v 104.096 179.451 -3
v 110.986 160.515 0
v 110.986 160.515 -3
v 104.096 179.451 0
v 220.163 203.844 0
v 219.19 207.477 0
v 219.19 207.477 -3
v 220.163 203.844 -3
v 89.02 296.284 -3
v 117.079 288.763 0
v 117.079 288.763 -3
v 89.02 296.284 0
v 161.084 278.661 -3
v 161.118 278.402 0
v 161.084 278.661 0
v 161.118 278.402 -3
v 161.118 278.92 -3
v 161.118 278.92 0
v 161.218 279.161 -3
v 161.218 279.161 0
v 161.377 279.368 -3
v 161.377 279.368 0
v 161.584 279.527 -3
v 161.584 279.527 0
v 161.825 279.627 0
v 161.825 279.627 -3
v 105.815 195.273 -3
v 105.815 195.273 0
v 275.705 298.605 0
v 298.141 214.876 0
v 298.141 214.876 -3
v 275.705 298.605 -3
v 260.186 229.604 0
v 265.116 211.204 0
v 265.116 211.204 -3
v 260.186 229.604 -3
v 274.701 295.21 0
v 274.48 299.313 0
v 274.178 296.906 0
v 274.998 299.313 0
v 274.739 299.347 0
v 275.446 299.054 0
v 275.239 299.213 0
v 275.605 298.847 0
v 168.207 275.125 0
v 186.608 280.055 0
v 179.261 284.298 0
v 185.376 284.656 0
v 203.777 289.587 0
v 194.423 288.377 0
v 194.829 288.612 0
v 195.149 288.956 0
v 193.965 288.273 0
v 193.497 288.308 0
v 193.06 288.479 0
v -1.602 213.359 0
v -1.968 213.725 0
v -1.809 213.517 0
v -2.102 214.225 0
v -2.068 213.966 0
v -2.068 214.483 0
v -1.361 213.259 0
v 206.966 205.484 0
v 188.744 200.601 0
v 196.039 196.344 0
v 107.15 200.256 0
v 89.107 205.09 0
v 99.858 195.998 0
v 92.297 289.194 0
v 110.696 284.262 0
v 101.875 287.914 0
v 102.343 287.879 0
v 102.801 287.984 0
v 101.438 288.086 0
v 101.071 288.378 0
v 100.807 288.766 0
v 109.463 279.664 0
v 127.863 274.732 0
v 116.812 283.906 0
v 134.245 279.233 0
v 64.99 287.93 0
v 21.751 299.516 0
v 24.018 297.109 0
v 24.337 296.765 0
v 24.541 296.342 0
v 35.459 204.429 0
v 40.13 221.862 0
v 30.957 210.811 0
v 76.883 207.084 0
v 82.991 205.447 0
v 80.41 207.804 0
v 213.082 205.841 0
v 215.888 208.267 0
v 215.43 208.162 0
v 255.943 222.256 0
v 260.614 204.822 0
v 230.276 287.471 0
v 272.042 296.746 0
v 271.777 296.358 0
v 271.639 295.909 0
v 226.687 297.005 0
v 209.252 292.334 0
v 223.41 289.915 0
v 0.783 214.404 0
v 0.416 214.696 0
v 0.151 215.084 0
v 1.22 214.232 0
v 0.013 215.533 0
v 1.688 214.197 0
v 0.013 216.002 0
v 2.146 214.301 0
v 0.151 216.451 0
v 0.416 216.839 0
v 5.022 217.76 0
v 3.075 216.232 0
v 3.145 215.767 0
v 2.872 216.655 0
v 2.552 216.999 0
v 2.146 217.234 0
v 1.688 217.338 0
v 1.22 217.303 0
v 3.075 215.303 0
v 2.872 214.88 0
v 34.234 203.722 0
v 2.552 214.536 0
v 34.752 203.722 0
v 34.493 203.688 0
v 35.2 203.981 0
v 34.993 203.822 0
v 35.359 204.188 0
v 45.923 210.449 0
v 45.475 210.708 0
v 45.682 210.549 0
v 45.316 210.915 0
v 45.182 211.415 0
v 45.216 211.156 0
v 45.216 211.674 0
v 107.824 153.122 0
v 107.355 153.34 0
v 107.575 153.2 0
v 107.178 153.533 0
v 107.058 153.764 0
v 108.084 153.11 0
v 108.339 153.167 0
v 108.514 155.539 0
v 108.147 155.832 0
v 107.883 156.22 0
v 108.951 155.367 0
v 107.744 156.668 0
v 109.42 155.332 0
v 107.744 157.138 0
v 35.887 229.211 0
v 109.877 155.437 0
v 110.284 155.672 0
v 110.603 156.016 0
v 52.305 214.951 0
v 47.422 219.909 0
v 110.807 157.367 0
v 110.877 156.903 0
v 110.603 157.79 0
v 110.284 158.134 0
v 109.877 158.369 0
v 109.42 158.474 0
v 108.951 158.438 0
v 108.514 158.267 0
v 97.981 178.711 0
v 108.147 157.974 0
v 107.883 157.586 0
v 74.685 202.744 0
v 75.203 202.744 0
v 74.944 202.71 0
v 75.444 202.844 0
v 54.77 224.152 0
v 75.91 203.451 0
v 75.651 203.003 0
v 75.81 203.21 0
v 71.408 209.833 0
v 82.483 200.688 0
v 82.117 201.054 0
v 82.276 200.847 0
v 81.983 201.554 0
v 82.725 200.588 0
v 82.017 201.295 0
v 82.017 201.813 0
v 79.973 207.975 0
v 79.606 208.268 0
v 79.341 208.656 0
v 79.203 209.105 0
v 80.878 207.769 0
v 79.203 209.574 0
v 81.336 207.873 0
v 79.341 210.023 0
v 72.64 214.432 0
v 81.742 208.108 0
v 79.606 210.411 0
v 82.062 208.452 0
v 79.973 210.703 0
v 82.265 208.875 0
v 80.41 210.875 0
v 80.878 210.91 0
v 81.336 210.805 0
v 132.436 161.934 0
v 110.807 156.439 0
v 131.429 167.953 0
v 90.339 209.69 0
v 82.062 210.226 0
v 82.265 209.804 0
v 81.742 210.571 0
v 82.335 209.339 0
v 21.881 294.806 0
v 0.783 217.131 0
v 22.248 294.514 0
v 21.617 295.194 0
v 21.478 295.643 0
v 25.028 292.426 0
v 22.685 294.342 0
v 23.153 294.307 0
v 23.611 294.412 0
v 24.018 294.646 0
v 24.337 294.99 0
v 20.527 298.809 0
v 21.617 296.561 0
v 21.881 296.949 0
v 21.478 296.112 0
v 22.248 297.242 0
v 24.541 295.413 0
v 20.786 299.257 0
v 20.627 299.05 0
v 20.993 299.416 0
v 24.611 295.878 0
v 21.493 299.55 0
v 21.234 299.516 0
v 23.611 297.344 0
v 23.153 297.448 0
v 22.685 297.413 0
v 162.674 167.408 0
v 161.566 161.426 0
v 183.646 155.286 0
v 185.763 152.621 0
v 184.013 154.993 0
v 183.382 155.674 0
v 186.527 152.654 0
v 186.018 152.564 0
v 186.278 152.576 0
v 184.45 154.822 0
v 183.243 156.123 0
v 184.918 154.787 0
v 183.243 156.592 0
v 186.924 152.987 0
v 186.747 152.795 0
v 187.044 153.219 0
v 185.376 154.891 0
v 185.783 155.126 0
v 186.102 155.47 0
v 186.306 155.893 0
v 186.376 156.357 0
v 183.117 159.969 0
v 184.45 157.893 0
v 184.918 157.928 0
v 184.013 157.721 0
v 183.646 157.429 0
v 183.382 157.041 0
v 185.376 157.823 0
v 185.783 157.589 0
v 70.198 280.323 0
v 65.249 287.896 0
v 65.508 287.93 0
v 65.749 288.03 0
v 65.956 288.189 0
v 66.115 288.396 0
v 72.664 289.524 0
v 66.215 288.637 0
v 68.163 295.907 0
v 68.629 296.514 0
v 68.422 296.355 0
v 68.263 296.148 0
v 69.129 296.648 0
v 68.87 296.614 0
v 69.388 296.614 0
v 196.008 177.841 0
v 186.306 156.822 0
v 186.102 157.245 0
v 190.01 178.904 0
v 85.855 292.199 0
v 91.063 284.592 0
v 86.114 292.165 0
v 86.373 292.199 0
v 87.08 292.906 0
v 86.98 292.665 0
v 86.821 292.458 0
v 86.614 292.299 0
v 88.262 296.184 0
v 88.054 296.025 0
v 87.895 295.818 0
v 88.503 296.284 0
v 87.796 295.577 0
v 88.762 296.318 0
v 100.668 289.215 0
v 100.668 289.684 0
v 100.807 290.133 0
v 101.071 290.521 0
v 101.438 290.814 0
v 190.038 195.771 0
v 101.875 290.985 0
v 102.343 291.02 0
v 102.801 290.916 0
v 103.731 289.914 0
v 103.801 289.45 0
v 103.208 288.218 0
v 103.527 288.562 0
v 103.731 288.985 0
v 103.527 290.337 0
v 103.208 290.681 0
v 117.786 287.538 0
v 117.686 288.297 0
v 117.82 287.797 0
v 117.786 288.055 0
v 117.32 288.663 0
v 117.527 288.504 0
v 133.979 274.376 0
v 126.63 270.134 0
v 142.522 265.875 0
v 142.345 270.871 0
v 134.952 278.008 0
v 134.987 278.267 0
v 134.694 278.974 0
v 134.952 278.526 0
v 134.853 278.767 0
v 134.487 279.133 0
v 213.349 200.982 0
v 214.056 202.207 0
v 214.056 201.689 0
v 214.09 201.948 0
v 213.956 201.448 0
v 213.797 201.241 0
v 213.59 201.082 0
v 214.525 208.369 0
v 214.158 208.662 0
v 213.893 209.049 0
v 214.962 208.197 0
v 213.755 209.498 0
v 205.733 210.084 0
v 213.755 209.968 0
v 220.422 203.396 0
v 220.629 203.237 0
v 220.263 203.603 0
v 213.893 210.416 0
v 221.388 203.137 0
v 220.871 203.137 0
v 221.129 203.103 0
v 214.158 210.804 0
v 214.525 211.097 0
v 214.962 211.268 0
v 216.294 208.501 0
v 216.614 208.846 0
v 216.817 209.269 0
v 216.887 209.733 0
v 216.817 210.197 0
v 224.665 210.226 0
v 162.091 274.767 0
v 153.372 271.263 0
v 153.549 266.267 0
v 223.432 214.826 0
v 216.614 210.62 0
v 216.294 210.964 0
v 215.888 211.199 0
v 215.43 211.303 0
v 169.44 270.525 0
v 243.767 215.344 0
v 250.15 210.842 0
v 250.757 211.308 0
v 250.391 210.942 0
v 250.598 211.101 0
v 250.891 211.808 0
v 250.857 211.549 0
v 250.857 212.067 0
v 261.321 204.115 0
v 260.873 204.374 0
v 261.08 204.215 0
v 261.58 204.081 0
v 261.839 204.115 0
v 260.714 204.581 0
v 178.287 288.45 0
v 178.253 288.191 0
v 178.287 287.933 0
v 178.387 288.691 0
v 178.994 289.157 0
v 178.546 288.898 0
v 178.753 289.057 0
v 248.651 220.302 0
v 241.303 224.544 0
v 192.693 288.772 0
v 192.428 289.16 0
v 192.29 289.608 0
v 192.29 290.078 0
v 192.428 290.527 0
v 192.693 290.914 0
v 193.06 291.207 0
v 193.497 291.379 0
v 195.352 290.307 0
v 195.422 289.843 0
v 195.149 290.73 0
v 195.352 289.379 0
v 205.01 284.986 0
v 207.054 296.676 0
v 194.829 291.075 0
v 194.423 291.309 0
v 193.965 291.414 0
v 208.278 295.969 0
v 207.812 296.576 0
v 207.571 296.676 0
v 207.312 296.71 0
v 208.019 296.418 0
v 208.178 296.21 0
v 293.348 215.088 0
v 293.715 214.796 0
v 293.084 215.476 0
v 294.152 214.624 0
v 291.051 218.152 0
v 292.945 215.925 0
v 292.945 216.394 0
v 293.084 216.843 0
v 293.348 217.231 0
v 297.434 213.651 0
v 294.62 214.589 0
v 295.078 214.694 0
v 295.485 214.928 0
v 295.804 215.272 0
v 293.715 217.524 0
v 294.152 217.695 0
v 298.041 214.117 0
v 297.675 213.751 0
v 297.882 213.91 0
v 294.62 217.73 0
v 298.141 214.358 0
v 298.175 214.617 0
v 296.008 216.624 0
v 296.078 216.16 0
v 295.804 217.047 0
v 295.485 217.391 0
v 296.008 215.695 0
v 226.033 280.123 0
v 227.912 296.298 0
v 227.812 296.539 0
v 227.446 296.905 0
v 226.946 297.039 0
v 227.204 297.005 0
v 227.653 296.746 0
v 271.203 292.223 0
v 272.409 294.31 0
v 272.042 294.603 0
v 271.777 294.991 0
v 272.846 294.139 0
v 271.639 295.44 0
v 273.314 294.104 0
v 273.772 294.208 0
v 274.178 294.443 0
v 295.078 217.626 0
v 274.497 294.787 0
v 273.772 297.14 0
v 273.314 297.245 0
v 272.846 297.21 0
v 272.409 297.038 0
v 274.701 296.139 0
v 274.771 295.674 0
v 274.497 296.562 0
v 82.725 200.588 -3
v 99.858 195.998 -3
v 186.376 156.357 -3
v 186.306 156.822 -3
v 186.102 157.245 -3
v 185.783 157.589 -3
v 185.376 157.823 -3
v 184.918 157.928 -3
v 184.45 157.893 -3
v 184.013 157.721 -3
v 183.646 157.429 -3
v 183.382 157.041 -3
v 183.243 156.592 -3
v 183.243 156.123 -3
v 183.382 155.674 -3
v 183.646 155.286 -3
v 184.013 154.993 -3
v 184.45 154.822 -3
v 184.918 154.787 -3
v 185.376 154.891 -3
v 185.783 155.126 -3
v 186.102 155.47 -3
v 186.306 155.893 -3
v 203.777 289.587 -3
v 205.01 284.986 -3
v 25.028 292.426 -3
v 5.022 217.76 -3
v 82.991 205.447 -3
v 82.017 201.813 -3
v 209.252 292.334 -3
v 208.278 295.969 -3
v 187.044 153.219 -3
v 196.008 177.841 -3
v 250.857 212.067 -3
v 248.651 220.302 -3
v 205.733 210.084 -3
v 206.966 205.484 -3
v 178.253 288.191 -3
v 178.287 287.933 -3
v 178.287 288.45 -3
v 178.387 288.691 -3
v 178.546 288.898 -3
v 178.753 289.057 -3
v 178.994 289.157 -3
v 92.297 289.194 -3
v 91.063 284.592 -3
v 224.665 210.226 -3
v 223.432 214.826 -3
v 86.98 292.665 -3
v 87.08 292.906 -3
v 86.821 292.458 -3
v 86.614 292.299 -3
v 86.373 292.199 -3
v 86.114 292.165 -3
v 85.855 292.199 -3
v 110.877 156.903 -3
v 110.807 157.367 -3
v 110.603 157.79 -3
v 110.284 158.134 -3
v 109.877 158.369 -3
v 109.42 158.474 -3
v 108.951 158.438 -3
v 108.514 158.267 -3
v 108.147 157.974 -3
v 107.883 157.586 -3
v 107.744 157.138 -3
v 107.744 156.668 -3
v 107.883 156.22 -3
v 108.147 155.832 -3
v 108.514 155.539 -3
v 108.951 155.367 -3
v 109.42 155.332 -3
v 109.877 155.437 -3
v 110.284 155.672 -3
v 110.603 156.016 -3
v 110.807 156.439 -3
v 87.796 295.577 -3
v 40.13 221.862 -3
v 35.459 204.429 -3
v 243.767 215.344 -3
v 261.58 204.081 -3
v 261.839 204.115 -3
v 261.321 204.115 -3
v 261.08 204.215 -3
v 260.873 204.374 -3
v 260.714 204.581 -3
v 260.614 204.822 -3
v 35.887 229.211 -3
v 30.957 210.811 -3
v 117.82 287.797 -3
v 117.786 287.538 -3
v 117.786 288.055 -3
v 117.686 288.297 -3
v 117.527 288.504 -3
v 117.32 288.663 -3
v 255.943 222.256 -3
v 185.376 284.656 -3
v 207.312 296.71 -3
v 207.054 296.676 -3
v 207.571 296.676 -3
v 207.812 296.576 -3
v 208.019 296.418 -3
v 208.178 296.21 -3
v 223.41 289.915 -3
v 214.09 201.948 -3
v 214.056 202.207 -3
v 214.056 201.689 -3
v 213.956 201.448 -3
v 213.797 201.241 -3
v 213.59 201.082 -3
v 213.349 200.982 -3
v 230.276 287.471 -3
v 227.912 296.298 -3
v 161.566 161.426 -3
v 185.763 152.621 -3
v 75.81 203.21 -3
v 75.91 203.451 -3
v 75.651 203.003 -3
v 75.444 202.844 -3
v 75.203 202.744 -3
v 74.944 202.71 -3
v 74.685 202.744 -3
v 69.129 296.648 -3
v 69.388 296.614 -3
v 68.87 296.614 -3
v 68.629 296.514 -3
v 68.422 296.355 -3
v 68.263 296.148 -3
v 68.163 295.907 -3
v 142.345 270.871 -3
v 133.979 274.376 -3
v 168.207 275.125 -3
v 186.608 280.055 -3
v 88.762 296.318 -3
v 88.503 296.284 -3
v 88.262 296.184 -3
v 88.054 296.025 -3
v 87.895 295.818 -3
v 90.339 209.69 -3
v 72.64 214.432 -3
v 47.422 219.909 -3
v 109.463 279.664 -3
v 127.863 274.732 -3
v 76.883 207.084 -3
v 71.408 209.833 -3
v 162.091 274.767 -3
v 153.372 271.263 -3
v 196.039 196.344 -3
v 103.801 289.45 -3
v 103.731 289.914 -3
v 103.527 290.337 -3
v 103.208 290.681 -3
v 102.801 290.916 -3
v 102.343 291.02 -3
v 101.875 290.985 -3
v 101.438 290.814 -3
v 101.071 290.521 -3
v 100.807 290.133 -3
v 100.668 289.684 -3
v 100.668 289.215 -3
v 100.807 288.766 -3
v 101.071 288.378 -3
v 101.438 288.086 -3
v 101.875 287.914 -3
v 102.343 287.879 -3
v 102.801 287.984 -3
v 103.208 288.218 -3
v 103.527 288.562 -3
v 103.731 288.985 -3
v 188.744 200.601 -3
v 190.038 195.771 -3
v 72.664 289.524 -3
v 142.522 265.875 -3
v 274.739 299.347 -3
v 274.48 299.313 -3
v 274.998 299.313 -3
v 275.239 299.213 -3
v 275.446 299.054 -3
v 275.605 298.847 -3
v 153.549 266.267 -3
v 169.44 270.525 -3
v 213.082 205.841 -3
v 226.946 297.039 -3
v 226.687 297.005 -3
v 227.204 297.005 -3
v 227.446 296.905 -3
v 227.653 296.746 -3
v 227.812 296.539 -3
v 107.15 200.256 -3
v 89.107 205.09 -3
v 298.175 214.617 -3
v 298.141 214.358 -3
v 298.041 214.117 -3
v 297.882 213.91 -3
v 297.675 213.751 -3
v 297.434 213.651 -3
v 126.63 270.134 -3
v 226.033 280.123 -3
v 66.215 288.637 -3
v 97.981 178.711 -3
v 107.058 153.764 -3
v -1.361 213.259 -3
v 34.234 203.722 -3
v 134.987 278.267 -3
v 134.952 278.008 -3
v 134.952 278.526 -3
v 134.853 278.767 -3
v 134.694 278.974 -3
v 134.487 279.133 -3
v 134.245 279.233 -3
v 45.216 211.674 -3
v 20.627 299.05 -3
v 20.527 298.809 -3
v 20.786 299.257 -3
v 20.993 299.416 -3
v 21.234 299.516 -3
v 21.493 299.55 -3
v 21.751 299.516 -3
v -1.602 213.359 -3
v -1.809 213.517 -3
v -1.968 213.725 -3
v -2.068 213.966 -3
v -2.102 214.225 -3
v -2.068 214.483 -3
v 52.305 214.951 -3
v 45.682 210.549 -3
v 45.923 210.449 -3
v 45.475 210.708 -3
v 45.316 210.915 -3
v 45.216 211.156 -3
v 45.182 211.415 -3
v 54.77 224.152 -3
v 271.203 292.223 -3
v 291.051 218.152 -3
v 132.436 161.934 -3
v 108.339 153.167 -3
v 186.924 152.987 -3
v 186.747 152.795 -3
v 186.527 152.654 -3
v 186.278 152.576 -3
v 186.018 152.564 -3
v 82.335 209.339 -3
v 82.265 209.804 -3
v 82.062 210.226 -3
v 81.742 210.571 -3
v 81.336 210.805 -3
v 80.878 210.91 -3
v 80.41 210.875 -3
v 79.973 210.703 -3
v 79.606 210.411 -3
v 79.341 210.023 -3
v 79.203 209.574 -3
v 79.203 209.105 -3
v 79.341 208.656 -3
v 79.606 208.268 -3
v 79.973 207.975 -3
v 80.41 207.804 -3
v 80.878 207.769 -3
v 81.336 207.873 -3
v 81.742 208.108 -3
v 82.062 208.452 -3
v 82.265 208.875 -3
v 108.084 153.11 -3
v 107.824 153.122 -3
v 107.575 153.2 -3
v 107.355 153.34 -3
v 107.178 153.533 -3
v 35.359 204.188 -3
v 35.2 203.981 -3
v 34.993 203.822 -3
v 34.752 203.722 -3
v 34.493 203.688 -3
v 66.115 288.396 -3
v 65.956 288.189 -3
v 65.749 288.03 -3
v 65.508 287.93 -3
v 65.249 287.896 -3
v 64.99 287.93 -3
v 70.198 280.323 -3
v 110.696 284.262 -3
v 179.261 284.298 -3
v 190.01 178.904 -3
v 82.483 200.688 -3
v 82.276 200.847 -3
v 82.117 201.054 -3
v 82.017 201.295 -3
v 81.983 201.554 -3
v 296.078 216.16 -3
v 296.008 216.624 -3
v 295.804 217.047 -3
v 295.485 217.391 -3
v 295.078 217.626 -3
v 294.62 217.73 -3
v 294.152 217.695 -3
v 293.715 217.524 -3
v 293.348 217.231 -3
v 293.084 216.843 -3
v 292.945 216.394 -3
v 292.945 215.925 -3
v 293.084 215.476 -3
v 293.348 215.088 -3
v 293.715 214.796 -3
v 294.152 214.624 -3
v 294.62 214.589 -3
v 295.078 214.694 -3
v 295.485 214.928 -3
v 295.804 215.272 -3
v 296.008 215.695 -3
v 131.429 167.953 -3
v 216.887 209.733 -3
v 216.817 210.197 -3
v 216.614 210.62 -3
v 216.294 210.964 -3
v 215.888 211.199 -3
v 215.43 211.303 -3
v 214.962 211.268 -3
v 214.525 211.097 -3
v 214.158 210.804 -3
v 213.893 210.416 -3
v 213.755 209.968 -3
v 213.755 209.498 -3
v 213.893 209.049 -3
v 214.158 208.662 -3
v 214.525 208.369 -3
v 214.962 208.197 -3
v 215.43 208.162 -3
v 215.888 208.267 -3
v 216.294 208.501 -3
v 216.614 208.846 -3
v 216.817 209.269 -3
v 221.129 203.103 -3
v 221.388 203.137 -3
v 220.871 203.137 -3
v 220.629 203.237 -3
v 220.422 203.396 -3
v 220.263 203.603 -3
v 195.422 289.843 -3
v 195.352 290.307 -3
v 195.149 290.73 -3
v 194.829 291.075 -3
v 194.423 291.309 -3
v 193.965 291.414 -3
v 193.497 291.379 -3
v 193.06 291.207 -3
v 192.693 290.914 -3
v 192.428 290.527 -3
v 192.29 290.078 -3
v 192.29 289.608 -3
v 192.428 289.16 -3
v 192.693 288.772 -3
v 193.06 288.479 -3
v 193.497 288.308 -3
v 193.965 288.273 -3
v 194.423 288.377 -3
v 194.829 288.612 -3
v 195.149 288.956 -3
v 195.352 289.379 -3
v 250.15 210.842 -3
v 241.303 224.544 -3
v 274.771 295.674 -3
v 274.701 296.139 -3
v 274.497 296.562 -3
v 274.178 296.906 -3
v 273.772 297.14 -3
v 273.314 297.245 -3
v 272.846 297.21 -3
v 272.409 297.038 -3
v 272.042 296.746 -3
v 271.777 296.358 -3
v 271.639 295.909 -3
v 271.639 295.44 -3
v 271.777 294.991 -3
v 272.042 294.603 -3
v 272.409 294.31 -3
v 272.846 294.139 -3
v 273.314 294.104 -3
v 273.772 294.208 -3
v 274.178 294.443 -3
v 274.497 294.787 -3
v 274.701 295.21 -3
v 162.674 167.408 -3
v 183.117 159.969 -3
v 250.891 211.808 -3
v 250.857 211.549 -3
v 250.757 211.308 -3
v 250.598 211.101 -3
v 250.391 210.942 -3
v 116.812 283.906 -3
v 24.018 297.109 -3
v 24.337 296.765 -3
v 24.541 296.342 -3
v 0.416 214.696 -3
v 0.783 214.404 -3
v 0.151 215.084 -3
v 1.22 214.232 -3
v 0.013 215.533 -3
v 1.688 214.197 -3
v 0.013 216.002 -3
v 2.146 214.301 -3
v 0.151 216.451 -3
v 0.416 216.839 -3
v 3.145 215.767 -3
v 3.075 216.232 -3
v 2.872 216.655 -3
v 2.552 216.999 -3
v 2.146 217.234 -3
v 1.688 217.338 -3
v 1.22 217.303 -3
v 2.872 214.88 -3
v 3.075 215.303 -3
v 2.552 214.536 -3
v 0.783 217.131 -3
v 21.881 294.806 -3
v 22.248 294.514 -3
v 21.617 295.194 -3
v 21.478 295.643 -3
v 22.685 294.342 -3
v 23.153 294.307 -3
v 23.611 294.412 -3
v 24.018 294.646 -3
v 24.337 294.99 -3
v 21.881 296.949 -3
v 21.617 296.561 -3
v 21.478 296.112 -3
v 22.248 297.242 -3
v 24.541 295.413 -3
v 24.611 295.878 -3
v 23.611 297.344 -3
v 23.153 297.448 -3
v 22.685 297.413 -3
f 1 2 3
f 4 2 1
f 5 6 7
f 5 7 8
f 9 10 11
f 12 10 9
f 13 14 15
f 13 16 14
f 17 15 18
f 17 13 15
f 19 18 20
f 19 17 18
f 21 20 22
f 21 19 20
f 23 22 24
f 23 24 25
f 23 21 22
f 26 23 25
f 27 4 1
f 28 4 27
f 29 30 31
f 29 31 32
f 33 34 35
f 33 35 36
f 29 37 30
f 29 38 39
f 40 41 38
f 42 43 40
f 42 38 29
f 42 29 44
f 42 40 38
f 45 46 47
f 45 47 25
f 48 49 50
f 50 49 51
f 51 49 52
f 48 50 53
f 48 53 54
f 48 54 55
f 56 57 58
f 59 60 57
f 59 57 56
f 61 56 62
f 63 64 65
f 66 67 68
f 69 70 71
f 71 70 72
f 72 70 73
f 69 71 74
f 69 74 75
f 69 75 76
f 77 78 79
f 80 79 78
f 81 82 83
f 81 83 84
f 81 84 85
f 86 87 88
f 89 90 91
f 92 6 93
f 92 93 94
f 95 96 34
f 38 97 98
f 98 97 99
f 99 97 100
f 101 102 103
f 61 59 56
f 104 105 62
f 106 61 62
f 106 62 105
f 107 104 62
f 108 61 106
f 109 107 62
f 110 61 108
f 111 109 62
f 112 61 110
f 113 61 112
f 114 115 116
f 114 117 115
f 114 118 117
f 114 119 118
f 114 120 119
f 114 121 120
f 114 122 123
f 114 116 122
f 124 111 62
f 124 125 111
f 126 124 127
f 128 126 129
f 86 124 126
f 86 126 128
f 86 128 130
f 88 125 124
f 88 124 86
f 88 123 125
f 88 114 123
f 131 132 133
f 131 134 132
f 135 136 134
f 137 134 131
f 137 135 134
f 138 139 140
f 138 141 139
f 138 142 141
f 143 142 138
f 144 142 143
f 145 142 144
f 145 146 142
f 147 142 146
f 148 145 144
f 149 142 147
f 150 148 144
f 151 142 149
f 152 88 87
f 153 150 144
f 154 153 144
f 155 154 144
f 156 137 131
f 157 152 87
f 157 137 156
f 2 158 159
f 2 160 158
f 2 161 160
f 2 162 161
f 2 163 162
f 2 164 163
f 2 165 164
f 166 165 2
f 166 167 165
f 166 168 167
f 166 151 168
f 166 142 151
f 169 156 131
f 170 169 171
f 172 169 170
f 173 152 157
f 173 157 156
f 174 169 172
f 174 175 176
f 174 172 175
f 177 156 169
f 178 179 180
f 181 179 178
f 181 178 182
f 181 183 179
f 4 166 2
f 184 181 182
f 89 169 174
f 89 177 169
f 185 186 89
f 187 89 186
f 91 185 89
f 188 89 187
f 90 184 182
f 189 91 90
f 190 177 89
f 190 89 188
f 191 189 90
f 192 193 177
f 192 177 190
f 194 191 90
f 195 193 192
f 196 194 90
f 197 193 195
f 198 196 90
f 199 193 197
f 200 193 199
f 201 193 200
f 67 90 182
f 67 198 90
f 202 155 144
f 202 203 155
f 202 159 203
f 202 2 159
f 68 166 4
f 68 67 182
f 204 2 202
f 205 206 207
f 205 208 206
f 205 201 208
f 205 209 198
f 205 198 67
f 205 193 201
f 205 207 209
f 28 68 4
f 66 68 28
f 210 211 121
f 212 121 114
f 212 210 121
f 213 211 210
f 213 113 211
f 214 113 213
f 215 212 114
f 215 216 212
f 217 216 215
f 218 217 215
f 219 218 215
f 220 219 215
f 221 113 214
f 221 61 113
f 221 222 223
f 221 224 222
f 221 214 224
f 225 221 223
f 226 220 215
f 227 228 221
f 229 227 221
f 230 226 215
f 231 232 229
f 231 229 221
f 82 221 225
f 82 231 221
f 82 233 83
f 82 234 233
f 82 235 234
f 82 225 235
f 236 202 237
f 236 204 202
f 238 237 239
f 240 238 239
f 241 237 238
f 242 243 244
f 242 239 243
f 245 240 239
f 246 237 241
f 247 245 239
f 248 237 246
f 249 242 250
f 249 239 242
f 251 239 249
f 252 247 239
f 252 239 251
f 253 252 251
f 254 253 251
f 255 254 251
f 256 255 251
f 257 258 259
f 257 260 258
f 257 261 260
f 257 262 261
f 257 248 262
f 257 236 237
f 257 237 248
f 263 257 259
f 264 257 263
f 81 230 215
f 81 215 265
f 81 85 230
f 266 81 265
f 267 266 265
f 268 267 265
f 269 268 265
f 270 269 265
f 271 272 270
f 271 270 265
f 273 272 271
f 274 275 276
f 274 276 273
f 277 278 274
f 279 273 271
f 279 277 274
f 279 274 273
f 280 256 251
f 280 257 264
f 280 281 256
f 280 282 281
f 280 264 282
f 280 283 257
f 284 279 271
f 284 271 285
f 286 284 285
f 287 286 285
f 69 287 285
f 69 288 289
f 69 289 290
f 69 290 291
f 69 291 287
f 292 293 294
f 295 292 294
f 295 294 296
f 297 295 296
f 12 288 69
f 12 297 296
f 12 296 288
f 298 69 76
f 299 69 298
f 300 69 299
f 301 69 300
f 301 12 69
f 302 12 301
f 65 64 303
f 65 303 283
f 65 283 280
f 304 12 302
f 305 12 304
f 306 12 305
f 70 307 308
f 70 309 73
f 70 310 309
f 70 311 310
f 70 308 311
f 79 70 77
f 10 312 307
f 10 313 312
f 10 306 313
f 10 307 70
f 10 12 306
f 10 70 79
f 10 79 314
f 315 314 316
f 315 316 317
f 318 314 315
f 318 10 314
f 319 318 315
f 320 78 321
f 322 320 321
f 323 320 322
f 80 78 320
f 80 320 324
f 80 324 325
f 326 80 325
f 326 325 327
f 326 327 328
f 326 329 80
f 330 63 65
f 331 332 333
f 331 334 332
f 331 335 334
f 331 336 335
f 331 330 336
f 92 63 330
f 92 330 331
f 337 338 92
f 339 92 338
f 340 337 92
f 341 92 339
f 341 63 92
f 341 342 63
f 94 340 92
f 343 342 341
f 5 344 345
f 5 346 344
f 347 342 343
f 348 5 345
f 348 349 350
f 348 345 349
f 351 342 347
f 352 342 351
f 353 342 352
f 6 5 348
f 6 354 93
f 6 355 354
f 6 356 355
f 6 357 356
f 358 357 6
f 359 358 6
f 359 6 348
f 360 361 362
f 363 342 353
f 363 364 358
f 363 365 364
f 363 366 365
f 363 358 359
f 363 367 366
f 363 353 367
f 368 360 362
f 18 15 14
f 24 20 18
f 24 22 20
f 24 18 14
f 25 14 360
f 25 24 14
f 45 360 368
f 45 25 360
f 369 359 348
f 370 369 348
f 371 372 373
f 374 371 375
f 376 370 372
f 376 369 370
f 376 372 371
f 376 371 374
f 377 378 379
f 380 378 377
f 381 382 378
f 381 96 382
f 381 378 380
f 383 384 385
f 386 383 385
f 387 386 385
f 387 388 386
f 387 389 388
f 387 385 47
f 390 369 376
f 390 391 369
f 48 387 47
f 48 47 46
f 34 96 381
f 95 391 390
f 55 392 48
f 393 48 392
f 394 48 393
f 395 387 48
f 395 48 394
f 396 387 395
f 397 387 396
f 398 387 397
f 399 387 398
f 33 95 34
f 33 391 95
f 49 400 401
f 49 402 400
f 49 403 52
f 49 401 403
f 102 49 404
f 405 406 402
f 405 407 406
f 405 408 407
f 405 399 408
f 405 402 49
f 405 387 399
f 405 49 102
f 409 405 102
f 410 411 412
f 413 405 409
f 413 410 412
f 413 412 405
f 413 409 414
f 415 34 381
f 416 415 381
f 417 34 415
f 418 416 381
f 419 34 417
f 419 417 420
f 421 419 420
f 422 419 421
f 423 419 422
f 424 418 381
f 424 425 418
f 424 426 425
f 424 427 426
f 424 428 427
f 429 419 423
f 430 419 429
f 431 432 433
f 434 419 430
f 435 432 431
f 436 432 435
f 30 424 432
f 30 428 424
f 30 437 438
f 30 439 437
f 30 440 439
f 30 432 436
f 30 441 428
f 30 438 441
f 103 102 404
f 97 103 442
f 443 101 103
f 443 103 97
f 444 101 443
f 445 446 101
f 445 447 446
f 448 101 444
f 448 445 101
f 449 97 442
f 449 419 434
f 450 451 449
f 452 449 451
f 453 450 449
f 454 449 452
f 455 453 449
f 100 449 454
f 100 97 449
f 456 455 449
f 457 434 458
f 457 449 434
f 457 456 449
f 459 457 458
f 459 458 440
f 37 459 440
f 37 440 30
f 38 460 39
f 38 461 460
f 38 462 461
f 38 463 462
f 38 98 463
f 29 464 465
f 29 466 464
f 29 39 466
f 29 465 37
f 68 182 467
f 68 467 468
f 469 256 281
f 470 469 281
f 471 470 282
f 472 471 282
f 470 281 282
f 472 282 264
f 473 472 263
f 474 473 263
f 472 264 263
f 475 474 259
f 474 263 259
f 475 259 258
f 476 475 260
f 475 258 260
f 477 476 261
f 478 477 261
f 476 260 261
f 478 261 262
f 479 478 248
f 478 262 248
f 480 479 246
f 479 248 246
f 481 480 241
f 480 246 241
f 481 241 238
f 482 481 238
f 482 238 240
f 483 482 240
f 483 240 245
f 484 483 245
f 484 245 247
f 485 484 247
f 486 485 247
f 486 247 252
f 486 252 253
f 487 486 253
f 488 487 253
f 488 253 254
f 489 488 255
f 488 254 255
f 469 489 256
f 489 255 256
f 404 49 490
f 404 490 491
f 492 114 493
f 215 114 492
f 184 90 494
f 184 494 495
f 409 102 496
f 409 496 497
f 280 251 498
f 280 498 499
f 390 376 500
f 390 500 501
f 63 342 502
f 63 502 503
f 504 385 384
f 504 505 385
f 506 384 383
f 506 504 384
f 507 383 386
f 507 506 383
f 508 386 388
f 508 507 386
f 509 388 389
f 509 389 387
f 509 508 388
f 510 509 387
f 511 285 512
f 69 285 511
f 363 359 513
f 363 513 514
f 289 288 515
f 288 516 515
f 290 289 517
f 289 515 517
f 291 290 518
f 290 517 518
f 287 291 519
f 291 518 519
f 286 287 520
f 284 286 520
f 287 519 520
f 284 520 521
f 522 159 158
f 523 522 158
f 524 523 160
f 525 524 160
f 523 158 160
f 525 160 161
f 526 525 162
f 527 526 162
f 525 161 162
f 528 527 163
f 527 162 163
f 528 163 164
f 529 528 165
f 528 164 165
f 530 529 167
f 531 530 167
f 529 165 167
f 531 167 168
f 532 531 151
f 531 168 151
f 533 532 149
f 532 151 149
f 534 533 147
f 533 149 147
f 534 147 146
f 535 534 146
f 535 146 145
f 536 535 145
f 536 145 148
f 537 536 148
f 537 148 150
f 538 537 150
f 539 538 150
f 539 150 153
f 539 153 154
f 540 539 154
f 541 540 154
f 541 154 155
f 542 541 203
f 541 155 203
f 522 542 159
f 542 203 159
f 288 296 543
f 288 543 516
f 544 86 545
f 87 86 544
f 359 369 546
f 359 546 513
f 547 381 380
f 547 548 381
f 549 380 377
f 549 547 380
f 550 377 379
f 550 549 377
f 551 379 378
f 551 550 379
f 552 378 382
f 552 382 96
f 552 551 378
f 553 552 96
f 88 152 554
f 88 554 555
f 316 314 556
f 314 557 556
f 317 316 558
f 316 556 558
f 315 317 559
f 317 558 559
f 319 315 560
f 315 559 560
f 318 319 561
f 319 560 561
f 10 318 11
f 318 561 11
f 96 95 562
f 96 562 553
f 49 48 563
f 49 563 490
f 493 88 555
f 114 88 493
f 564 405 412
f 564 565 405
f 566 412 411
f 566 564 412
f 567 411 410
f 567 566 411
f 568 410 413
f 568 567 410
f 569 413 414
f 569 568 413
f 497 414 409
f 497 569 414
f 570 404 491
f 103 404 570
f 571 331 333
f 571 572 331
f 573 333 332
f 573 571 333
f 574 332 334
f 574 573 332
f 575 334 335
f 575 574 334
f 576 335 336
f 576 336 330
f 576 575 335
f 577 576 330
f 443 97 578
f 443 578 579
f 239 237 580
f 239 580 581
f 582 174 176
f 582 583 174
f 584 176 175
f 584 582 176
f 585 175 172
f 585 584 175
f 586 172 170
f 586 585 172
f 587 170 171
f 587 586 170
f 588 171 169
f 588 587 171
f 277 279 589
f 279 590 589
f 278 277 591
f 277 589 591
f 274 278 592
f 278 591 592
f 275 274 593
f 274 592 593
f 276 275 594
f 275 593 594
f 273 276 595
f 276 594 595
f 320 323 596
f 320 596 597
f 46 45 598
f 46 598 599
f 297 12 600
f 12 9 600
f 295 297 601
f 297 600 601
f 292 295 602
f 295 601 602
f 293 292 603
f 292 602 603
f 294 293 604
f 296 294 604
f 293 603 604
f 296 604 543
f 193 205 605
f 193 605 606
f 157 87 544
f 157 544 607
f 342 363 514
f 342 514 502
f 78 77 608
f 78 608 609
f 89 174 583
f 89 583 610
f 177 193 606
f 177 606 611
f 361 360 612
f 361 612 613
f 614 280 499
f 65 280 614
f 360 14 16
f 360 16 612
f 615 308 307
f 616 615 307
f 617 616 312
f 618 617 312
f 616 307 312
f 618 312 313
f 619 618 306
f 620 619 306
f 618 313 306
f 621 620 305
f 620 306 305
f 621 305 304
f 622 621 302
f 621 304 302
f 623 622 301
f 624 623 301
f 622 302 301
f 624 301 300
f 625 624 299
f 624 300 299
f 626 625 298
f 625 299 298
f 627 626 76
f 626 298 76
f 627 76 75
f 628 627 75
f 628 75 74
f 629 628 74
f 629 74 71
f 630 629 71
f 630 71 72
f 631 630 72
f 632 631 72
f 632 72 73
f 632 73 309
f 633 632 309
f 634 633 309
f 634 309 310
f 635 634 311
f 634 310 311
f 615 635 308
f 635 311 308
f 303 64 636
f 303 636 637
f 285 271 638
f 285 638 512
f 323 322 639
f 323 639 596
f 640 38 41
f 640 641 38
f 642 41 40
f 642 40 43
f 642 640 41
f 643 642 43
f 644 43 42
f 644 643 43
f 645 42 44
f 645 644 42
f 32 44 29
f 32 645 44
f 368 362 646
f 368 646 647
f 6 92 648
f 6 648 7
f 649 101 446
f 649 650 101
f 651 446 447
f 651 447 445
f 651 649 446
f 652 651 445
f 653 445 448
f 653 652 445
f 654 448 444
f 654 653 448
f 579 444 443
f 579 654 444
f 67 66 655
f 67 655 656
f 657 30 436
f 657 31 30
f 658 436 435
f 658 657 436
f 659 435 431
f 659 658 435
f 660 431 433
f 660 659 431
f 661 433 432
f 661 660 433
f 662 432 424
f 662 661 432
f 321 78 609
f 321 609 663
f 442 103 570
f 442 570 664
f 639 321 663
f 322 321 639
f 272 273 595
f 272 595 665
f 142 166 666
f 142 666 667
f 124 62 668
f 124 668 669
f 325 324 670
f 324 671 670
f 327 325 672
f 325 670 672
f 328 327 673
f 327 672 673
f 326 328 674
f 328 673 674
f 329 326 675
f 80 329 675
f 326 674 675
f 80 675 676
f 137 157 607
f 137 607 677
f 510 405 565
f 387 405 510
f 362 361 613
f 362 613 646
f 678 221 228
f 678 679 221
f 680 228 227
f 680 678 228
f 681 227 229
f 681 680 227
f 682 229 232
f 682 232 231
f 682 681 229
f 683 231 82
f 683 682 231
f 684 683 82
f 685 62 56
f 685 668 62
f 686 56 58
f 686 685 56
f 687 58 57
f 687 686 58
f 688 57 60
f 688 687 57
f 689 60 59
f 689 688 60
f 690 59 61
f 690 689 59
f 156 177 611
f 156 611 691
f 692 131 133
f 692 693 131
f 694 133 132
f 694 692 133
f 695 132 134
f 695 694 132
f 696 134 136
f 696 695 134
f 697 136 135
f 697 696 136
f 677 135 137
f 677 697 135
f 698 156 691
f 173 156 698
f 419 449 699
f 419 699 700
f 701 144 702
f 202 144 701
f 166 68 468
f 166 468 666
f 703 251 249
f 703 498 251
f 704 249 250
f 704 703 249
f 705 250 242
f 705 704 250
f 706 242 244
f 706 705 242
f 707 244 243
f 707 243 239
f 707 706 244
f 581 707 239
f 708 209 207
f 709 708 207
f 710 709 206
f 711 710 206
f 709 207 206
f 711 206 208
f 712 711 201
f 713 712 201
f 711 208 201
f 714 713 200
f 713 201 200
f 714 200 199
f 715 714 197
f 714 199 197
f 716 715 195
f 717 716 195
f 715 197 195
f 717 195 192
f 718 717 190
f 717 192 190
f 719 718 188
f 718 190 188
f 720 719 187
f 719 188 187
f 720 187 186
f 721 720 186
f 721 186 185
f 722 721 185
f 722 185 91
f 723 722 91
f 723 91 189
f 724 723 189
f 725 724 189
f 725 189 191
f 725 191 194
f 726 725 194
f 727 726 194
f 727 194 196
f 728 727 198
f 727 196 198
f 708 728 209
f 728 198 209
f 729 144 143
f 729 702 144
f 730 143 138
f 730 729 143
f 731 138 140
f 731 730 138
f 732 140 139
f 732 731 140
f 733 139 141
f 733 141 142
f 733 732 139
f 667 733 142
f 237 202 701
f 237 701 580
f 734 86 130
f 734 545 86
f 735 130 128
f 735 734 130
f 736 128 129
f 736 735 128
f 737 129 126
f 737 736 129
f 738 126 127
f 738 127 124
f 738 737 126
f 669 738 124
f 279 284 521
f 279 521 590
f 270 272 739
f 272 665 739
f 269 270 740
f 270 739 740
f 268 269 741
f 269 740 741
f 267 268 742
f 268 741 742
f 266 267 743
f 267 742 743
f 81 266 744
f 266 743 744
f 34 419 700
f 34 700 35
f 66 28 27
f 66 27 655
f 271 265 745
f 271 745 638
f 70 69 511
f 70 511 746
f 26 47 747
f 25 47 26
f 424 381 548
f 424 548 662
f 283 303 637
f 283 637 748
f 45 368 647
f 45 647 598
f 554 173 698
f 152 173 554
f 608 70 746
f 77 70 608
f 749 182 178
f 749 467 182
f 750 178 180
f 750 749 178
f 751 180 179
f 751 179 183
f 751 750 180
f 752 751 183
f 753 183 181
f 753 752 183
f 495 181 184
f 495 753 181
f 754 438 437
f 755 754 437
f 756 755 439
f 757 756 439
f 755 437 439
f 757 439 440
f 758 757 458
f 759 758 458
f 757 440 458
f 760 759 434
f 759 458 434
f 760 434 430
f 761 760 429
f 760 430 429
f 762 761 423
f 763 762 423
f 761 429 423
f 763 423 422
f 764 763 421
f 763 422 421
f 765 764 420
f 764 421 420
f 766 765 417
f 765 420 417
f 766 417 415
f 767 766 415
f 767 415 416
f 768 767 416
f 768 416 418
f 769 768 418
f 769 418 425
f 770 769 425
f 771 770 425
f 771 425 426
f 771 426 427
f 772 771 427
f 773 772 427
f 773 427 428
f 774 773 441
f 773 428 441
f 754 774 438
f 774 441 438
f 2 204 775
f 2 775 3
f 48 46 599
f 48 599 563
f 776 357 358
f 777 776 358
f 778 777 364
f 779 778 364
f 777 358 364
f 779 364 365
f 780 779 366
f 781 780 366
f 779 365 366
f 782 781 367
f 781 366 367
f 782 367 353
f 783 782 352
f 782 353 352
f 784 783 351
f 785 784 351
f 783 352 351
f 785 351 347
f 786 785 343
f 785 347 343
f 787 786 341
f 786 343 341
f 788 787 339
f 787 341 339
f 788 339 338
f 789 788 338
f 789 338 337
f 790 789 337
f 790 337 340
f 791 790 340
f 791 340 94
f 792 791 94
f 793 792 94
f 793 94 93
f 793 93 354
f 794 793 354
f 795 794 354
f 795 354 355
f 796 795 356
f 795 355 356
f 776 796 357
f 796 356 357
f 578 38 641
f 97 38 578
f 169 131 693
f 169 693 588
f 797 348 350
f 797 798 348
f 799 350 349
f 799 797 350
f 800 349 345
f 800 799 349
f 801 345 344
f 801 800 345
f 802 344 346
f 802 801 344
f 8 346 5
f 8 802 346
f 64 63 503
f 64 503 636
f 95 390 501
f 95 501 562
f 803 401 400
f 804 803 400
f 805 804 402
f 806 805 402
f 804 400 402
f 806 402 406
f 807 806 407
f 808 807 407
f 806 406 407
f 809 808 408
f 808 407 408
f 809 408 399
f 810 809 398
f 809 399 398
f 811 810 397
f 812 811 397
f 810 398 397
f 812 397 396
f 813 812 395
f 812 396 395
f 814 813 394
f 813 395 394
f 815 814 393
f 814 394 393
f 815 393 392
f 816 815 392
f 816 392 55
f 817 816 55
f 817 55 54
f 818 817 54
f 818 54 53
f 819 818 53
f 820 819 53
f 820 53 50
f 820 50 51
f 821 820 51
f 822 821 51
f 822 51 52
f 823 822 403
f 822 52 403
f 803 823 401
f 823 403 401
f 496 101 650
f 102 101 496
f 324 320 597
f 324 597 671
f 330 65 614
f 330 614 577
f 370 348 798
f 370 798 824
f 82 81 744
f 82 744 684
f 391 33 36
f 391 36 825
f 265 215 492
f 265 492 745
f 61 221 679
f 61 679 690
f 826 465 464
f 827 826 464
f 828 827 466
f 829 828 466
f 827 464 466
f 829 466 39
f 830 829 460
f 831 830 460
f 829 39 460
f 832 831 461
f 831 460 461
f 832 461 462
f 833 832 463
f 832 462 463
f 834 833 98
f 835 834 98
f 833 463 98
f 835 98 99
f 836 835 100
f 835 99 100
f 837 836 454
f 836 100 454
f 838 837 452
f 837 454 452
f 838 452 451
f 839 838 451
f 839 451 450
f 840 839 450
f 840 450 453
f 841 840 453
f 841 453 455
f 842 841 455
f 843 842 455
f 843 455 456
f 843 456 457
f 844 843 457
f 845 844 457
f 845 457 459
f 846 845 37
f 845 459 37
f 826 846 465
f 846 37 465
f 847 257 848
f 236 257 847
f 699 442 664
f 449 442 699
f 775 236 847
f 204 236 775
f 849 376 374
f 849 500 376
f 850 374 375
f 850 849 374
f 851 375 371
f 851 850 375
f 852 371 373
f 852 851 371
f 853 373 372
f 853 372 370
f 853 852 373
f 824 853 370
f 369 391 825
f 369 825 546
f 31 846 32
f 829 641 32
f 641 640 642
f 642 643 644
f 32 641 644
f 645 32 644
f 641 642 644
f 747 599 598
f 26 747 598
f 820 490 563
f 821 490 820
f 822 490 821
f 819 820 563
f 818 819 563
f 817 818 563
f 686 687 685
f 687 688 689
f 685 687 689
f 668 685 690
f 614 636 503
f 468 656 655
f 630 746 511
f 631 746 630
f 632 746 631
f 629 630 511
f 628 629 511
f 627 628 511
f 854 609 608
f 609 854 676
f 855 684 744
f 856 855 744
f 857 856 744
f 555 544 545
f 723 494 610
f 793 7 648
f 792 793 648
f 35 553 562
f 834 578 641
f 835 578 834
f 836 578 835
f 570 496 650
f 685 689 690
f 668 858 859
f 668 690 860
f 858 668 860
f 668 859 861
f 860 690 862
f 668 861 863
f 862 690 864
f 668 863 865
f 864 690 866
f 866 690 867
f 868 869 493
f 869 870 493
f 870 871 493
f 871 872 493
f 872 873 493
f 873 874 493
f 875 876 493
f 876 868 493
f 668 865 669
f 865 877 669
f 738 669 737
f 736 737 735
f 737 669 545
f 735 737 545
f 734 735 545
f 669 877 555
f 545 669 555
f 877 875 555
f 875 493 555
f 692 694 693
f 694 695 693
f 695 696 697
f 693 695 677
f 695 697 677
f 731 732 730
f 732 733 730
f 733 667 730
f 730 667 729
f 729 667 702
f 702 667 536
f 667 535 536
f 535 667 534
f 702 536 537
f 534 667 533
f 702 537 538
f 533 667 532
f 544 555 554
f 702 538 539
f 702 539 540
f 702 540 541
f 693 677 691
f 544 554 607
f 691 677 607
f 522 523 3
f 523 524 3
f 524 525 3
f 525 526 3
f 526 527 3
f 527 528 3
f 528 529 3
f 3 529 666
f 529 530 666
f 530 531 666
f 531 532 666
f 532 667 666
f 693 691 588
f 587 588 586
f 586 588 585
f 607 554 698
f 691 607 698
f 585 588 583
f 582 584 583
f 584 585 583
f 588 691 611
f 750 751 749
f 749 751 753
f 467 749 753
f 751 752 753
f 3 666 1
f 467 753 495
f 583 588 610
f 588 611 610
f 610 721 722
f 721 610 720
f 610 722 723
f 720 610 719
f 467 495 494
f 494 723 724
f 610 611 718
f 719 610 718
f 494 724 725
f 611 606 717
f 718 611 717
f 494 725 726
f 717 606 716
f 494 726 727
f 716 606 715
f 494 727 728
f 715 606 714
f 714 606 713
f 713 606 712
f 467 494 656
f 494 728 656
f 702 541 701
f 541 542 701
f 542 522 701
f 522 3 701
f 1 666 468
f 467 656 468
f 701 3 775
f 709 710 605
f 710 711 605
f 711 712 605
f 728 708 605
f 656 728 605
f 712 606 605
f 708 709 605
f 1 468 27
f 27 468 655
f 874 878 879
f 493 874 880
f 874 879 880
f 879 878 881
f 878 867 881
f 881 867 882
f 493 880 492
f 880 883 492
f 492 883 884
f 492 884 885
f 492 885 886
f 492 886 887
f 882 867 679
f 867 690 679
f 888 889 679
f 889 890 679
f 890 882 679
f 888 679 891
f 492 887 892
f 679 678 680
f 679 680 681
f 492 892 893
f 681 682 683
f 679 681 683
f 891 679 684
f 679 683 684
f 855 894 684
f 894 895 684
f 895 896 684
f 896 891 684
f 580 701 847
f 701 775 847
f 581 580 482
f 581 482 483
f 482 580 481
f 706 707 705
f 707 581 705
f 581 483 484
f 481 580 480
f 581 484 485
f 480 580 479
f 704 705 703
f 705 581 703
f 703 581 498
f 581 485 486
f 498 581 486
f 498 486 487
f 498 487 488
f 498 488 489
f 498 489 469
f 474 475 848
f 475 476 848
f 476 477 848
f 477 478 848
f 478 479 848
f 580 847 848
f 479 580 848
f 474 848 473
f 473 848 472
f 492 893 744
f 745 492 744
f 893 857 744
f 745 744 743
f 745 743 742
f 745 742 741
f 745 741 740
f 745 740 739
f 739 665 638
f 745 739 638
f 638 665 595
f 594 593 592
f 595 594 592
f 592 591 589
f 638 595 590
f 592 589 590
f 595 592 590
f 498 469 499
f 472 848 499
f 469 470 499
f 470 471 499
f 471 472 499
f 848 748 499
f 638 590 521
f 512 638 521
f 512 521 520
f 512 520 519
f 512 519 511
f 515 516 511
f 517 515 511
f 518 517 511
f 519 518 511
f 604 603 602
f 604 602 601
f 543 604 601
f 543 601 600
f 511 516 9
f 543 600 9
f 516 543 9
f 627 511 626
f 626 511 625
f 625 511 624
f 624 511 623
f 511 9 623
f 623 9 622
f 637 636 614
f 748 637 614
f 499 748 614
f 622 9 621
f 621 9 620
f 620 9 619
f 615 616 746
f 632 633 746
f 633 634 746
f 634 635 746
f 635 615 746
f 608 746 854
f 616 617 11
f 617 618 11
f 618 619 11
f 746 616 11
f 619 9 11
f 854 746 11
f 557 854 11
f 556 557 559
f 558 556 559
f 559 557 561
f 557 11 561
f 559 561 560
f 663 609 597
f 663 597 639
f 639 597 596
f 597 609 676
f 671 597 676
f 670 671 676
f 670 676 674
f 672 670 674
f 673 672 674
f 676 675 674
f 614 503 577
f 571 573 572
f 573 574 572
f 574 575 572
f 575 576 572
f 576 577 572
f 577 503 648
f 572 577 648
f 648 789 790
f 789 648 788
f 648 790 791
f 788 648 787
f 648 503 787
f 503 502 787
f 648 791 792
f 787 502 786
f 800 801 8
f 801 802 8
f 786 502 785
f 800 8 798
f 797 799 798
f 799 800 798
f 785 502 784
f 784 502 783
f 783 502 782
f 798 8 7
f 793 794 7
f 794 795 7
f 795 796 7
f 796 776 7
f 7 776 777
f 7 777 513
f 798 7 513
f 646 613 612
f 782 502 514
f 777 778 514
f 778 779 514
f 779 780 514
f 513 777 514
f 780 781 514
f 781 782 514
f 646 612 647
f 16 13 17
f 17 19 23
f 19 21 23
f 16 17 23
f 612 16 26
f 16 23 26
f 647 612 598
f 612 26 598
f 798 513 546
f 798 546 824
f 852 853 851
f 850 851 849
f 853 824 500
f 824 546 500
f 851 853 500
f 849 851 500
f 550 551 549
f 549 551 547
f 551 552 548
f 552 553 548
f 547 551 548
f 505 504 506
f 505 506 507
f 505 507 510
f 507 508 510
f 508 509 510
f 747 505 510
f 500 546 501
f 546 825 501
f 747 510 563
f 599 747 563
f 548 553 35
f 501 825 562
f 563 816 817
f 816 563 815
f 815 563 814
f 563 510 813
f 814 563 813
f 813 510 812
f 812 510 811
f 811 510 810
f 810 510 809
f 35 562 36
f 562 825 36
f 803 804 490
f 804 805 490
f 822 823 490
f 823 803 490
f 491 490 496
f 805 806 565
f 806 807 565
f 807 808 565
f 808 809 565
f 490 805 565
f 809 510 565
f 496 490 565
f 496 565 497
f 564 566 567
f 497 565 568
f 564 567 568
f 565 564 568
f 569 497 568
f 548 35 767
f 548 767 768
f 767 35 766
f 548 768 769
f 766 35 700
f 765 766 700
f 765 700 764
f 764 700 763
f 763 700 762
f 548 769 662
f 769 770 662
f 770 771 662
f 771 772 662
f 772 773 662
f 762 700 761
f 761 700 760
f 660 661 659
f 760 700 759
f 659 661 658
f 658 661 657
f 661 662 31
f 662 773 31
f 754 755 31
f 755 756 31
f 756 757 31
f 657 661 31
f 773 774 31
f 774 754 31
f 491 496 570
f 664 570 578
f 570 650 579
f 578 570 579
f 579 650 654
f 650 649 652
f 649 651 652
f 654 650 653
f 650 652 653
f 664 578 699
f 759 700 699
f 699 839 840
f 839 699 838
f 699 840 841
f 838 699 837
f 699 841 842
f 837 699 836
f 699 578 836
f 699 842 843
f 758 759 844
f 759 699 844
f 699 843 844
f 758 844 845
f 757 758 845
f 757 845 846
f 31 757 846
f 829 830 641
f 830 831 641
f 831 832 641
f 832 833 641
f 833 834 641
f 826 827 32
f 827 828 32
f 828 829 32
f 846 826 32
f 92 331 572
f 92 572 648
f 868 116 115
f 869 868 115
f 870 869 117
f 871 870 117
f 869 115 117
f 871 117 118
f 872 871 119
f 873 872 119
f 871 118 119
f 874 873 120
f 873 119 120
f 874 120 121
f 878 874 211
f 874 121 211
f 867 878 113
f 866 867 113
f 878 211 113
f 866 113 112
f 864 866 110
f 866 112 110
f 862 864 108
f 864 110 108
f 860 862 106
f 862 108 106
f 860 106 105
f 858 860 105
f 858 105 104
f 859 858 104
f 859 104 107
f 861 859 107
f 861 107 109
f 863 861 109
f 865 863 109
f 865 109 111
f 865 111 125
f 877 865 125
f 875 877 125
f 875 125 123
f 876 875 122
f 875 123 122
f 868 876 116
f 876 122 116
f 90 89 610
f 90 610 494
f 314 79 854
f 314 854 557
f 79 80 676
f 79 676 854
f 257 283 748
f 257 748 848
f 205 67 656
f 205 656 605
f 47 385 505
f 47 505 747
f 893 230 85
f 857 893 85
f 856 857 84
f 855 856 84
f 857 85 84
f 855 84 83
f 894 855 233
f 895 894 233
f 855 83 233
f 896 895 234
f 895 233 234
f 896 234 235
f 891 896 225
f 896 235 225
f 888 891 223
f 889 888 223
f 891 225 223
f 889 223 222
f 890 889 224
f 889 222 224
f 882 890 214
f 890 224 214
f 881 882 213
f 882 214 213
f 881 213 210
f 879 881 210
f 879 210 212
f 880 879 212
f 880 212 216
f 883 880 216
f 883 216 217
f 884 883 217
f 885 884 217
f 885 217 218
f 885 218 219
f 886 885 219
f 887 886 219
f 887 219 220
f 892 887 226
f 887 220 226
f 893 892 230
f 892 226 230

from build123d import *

# Parameters (mm, degrees)
MODEL_R             = 1.575
BOSS_EXTRUDE1_DEPTH = 3
FILLET1_R           = 1


with BuildPart() as part:
    # Model → Boss-Extrude1 (new body)
    with BuildSketch(Plane.XY):
        Polygon((271.203498451, 292.223209107), (291.05122826, 218.15247975), (265.115556398, 211.204247731), (260.186189629, 229.604099473), (241.30271159, 224.544411578), (243.767491017, 215.34412721), (224.664804007, 210.226469096), (223.432328054, 214.825649934), (205.733277658, 210.084029615), (206.966112962, 205.483507804), (188.744476932, 200.600523414), (190.038361872, 195.770837942), (190.009613349, 178.903688177), (183.116533861, 159.968814913), (162.674398087, 167.40803076), (131.428930231, 167.95289908), (110.986427135, 160.514692668), (104.096364698, 179.45072575), (105.814746135, 195.273012707), (107.149713912, 200.256048118), (89.106877808, 205.089769496), (90.339405557, 209.690426923), (72.639899407, 214.432169339), (71.407895987, 209.833469074), (52.305208977, 214.951127188), (54.770081908, 224.151554257), (35.886712889, 229.210569975), (30.957132238, 210.811459981), (5.0216469, 217.76022363), (25.028202346, 292.426367848), (70.198239559, 280.323200295), (72.663861356, 289.523562363), (91.063082461, 284.591613875), (92.29653696, 289.193676092), (110.695758065, 284.261727603), (109.463398178, 279.663749421), (127.862619282, 274.731800932), (126.630323598, 270.134062294), (142.522359716, 265.874644989), (142.344694619, 270.871486432), (133.979081507, 274.376202933), (135.211333861, 278.973779905), (116.812112756, 283.905728394), (118.044472643, 288.503706576), (88.054439652, 296.542595671), (86.820985153, 291.940533454), (68.42160019, 296.872525865), (65.955825932, 287.671594898), (20.785545351, 299.774827661), (-2.32684459, 213.517448416), (35.199939127, 203.463086712), (40.129543563, 221.862285479), (47.421773629, 219.90863481), (44.956891994, 210.708175253), (75.650856625, 202.485184579), (76.882860045, 207.083884844), (82.991121062, 205.447466285), (81.758593313, 200.846808858), (99.858189105, 195.997881416), (97.980730454, 178.710864183), (107.399642776, 152.824765622), (132.435827139, 161.934428279), (161.565977706, 161.426447529), (186.702312667, 152.27893851), (196.007810089, 177.840578221), (196.039346948, 196.343682115), (214.314693354, 201.241059665), (213.081966369, 205.841177268), (219.189771603, 207.477473721), (220.422247557, 202.878292884), (251.115775513, 211.101166572), (248.650938057, 220.301667543), (255.943287021, 222.255598366), (260.87259576, 203.855963236), (298.39980436, 213.909597233), (275.446186014, 299.571346393), (230.276304619, 287.470798216), (227.65276755, 297.263677376), (209.252454514, 292.334187025), (208.019481767, 296.93522173), (178.028627015, 288.898354165), (179.260689602, 284.297666211), (160.85900272, 279.367807803), (162.091473536, 274.767362889), (153.371764929, 271.263453794), (153.549484965, 266.266603363), (169.439649748, 270.524806438), (168.207287216, 275.124847165), (186.60841776, 280.054556529), (185.376246939, 284.655648642), (203.777033628, 289.586641337), (205.009898064, 284.986010813), (223.409806911, 289.915392881), (226.033325469, 280.122582817), align=None)
        with Locations((23.035554, 295.877718337)):
            Circle(MODEL_R, mode=Mode.SUBTRACT)
        with Locations((109.301822433, 156.902965293)):
            Circle(MODEL_R, mode=Mode.SUBTRACT)
        with Locations((184.800560745, 156.35733766)):
            Circle(MODEL_R, mode=Mode.SUBTRACT)
        with Locations((193.847437398, 289.84318413)):
            Circle(MODEL_R, mode=Mode.SUBTRACT)
        with Locations((102.225689846, 289.449650012)):
            Circle(MODEL_R, mode=Mode.SUBTRACT)
        with Locations((273.19609114, 295.674286852)):
            Circle(MODEL_R, mode=Mode.SUBTRACT)
        with Locations((1.570241786, 215.767496811)):
            Circle(MODEL_R, mode=Mode.SUBTRACT)
        with Locations((294.502731407, 216.159668876)):
            Circle(MODEL_R, mode=Mode.SUBTRACT)
        with Locations((80.760413887, 209.339268578)):
            Circle(MODEL_R, mode=Mode.SUBTRACT)
        with Locations((215.312231294, 209.732861073)):
            Circle(MODEL_R, mode=Mode.SUBTRACT)
    extrude(amount=-BOSS_EXTRUDE1_DEPTH)

    # Fillet1
    fillet1_edges = [part.edges().sort_by_distance(p)[0] for p in [
        (160.85900272, 279.367807803, -1.5),
        (178.028627015, 288.898354165, -1.5),
        (208.019481767, 296.93522173, -1.5),
        (227.65276755, 297.263677376, -1.5),
        (275.446186014, 299.571346393, -1.5),
        (298.39980436, 213.909597233, -1.5),
        (260.87259576, 203.855963236, -1.5),
        (251.115775513, 211.101166572, -1.5),
        (220.422247557, 202.878292884, -1.5),
        (214.314693354, 201.241059665, -1.5),
        (186.702312667, 152.27893851, -1.5),
        (107.399642776, 152.824765622, -1.5),
        (81.758593313, 200.846808858, -1.5),
        (75.650856625, 202.485184579, -1.5),
        (44.956891994, 210.708175253, -1.5),
        (35.199939127, 203.463086712, -1.5),
        (-2.32684459, 213.517448416, -1.5),
        (20.785545351, 299.774827661, -1.5),
        (65.955825932, 287.671594898, -1.5),
        (68.42160019, 296.872525865, -1.5),
        (86.820985153, 291.940533454, -1.5),
        (88.054439652, 296.542595671, -1.5),
        (118.044472643, 288.503706576, -1.5),
        (135.211333861, 278.973779905, -1.5),
    ]]
    fillet(fillet1_edges, radius=FILLET1_R)


solid = part.part
